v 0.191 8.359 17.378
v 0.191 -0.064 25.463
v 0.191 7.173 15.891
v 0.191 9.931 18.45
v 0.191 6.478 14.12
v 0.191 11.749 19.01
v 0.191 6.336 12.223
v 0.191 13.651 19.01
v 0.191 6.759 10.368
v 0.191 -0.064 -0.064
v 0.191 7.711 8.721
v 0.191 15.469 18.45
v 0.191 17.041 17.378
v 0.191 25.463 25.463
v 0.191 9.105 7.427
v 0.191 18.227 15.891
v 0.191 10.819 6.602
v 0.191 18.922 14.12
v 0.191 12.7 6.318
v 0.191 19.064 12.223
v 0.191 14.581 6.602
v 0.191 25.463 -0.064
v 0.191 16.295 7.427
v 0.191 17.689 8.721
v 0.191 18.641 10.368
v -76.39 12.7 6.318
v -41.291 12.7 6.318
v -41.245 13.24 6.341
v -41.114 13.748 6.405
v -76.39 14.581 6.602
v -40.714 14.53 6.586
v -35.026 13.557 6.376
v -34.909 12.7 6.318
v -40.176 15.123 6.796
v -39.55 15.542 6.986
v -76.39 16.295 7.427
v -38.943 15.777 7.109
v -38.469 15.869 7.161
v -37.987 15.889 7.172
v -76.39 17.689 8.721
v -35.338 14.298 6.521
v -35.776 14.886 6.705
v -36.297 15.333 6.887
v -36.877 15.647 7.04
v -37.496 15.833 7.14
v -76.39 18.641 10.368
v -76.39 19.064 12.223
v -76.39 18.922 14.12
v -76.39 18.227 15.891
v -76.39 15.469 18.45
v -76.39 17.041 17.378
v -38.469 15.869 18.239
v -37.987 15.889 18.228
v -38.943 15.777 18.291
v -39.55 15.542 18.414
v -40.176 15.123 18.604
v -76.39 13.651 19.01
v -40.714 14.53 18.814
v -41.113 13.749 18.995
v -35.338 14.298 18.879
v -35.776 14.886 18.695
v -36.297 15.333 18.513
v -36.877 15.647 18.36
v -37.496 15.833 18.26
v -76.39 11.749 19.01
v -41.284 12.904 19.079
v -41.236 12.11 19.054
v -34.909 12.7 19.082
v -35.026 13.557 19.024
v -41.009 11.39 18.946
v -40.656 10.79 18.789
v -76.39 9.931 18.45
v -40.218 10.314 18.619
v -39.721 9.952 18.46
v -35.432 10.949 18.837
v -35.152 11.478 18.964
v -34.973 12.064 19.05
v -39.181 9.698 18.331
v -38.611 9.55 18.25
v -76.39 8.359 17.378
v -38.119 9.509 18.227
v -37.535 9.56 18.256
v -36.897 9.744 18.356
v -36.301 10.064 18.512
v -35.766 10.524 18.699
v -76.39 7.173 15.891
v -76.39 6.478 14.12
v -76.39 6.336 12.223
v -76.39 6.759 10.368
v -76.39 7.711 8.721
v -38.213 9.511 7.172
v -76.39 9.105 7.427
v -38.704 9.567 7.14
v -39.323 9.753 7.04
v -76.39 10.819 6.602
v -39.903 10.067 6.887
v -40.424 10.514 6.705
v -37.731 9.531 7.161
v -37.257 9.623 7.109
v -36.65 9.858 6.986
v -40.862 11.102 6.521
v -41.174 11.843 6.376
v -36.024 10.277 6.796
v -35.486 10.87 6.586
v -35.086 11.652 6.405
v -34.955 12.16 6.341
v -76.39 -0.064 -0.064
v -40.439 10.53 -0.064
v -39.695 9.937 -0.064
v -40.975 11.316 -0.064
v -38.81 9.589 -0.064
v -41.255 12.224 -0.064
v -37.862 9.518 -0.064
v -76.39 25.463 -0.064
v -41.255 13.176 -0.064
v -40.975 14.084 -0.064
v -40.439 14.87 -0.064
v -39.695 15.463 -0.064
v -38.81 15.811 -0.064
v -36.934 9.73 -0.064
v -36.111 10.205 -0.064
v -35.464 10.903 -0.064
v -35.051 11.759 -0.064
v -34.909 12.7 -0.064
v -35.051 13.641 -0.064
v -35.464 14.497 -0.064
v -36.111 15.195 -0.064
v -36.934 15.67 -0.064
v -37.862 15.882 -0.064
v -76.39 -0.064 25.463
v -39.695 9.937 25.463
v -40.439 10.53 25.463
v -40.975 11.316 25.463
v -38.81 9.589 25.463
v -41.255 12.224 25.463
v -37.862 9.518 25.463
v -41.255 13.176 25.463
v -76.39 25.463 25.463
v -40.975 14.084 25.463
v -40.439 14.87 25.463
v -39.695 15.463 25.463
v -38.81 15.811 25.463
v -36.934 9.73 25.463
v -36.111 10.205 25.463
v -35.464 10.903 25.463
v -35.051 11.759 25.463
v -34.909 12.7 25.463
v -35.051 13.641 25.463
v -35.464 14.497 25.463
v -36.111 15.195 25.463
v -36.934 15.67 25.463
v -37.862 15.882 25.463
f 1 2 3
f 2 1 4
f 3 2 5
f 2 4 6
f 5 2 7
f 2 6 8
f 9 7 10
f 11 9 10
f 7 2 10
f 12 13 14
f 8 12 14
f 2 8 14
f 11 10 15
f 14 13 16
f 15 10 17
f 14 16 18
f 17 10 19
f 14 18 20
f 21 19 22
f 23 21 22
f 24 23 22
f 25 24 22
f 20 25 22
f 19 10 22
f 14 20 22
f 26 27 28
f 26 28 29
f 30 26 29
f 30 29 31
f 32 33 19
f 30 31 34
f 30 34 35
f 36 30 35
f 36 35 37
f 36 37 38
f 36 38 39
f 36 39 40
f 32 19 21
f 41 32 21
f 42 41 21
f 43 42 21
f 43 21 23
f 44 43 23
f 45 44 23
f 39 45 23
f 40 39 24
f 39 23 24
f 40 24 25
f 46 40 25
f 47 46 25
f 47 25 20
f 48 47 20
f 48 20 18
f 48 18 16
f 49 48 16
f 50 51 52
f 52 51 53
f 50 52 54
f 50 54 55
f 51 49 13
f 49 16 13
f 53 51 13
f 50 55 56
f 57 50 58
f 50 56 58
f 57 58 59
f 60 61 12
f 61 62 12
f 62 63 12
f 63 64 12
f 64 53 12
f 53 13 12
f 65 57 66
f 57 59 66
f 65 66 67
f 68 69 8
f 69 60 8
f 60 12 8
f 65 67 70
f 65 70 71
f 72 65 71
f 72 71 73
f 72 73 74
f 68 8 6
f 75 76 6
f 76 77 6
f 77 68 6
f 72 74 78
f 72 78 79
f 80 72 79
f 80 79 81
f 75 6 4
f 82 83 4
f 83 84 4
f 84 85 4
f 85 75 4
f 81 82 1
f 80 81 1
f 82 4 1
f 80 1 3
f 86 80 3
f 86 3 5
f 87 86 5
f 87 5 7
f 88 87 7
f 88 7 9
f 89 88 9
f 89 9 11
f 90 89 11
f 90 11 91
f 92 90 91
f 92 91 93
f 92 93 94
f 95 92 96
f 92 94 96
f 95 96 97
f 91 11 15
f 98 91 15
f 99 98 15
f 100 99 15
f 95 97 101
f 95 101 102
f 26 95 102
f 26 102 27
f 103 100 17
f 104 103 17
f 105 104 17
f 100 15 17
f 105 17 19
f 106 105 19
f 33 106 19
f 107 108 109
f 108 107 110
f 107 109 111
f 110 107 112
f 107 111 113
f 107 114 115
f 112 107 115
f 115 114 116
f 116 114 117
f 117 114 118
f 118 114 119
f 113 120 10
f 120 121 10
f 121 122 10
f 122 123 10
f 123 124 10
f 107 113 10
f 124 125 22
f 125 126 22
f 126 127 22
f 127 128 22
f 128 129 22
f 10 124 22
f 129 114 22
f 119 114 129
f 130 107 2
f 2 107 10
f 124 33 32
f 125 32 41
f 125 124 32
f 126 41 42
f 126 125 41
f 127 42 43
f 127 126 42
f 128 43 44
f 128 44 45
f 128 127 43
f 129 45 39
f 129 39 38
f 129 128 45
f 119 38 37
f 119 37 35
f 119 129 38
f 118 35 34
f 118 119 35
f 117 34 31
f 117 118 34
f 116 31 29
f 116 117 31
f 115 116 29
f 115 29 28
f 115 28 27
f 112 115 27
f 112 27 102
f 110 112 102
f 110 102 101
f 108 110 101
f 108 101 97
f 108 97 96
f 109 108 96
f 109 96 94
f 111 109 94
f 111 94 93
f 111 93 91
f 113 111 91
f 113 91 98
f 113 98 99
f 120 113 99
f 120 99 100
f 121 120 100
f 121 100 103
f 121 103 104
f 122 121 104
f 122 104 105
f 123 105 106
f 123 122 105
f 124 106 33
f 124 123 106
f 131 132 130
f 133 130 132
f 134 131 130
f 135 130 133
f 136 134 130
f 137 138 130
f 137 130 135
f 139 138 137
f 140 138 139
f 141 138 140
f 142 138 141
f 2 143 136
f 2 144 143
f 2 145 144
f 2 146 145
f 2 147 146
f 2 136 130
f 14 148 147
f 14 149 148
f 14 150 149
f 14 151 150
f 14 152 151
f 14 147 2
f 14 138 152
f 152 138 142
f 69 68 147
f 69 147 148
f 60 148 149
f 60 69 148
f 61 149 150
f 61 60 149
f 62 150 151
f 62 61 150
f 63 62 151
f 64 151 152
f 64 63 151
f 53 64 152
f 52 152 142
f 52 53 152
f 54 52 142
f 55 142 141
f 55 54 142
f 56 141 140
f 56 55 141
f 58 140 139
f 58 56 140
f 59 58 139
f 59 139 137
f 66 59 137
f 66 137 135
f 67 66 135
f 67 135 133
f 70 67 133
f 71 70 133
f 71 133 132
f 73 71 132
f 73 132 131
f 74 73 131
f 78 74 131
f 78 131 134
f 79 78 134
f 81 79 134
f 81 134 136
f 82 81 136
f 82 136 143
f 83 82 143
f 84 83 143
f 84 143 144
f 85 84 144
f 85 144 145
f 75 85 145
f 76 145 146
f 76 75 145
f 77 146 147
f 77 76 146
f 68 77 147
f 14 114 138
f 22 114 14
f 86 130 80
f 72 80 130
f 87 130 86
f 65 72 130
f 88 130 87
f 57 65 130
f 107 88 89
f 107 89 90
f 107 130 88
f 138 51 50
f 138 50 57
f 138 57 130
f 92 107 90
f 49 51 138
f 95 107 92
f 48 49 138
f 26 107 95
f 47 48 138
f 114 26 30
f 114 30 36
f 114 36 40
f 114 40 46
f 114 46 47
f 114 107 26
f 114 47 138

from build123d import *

# Parameters (mm, degrees)
SKETCH1_W           = 76.2
SKETCH1_H           = 25.4
SKETCH1_R           = 3.175
BOSS_EXTRUDE1_DEPTH = 25.4
SKETCH2_R           = 6.35
CUT_EXTRUDE1_DEPTH  = 85.242269675
SCALE1_SCALE        = 1.5
SCALE2_SCALE        = 0.67


with BuildPart() as part:
    # Sketch1 → Boss-Extrude1 (new body)
    with BuildSketch(Plane.XY):
        with Locations((-38.1, 12.7)):
            Rectangle(SKETCH1_W, SKETCH1_H)
        with Locations((-38.1, 12.7)):
            Circle(SKETCH1_R, mode=Mode.SUBTRACT)
    extrude(amount=BOSS_EXTRUDE1_DEPTH)

    # Sketch2 → Cut-Extrude1 (cut, through all)
    with BuildSketch(Plane(origin=(0, 0, 0), x_dir=(0, 0, -1), z_dir=(1, 0, 0))):
        with Locations((-12.7, 12.7)):
            Circle(SKETCH2_R)
    extrude(amount=-CUT_EXTRUDE1_DEPTH, mode=Mode.SUBTRACT)


with BuildPart() as part_1:
    # Scale1: scaled about (-38.100000058, 12.700000154, 12.700000148)
    add(part.part.scale(SCALE1_SCALE).moved(Location((19.050000029, -6.350000077, -6.350000074))))


with BuildPart() as part_2:
    # Scale2: scaled about (-38.100000058, 12.700000155, 12.700000148)
    add(part_1.part.scale(SCALE2_SCALE).moved(Location((-12.573000019, 4.191000051, 4.191000049))))


solid = part_2.part
